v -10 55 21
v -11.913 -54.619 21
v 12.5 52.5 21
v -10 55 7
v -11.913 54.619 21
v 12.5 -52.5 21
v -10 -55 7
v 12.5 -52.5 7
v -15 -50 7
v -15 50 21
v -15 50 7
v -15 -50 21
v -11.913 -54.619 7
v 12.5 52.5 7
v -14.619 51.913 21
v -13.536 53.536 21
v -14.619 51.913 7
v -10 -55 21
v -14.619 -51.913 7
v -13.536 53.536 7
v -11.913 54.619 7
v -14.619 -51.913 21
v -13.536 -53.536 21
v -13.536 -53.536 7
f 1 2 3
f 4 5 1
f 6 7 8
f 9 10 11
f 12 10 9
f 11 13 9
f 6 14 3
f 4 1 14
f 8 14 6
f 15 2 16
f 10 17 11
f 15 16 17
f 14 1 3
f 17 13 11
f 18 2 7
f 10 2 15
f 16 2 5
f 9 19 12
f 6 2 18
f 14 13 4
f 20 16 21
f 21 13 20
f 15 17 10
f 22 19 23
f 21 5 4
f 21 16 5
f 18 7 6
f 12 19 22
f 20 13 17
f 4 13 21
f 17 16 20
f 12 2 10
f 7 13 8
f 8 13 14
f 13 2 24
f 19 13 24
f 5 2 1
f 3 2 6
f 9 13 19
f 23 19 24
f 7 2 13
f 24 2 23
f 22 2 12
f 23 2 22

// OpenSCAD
/*
https://www.lwfasteners.com.tw/index.php?option=module&lang=en&task=pageinfo&id=51&index=1
https://github.com/openscad/openscad/issues/405

Bolt_M1_4 = 0;
Bolt_M1_6 = 1;
Bolt_M2 = 2;
Bolt_M2_5 = 3;
Bolt_M3 = 4;
Bolt_M4 = 5;
Bolt_M5 = 6;

// DIN 912 screws across flats sizes
//          M1.4 M1.6 M2   M2.5 M3   M4   M5   M6
DIN912_s = [1.5, 1.5, 1.5, 2.0, 2.5, 3.0, 4.0, 5.0, 6.0, 8.0, 10.0, 12.0, 14.0, 17.0];

*/

module case(t,l,h,r) {
    hull(){
        translate([-t/2, l/2, h])
            cylinder(h=h, r=r,center=true);
        translate([t/2, l/2, h])
            cube([r,r,h],center=true);
        translate([t/2, -l/2, h])
            cube([r,r,h],center=true);
        translate([-t/2, -l/2, h])
            cylinder(h=h, r=r,center=true);
    }
}


case(20, 100, 14, 5);
